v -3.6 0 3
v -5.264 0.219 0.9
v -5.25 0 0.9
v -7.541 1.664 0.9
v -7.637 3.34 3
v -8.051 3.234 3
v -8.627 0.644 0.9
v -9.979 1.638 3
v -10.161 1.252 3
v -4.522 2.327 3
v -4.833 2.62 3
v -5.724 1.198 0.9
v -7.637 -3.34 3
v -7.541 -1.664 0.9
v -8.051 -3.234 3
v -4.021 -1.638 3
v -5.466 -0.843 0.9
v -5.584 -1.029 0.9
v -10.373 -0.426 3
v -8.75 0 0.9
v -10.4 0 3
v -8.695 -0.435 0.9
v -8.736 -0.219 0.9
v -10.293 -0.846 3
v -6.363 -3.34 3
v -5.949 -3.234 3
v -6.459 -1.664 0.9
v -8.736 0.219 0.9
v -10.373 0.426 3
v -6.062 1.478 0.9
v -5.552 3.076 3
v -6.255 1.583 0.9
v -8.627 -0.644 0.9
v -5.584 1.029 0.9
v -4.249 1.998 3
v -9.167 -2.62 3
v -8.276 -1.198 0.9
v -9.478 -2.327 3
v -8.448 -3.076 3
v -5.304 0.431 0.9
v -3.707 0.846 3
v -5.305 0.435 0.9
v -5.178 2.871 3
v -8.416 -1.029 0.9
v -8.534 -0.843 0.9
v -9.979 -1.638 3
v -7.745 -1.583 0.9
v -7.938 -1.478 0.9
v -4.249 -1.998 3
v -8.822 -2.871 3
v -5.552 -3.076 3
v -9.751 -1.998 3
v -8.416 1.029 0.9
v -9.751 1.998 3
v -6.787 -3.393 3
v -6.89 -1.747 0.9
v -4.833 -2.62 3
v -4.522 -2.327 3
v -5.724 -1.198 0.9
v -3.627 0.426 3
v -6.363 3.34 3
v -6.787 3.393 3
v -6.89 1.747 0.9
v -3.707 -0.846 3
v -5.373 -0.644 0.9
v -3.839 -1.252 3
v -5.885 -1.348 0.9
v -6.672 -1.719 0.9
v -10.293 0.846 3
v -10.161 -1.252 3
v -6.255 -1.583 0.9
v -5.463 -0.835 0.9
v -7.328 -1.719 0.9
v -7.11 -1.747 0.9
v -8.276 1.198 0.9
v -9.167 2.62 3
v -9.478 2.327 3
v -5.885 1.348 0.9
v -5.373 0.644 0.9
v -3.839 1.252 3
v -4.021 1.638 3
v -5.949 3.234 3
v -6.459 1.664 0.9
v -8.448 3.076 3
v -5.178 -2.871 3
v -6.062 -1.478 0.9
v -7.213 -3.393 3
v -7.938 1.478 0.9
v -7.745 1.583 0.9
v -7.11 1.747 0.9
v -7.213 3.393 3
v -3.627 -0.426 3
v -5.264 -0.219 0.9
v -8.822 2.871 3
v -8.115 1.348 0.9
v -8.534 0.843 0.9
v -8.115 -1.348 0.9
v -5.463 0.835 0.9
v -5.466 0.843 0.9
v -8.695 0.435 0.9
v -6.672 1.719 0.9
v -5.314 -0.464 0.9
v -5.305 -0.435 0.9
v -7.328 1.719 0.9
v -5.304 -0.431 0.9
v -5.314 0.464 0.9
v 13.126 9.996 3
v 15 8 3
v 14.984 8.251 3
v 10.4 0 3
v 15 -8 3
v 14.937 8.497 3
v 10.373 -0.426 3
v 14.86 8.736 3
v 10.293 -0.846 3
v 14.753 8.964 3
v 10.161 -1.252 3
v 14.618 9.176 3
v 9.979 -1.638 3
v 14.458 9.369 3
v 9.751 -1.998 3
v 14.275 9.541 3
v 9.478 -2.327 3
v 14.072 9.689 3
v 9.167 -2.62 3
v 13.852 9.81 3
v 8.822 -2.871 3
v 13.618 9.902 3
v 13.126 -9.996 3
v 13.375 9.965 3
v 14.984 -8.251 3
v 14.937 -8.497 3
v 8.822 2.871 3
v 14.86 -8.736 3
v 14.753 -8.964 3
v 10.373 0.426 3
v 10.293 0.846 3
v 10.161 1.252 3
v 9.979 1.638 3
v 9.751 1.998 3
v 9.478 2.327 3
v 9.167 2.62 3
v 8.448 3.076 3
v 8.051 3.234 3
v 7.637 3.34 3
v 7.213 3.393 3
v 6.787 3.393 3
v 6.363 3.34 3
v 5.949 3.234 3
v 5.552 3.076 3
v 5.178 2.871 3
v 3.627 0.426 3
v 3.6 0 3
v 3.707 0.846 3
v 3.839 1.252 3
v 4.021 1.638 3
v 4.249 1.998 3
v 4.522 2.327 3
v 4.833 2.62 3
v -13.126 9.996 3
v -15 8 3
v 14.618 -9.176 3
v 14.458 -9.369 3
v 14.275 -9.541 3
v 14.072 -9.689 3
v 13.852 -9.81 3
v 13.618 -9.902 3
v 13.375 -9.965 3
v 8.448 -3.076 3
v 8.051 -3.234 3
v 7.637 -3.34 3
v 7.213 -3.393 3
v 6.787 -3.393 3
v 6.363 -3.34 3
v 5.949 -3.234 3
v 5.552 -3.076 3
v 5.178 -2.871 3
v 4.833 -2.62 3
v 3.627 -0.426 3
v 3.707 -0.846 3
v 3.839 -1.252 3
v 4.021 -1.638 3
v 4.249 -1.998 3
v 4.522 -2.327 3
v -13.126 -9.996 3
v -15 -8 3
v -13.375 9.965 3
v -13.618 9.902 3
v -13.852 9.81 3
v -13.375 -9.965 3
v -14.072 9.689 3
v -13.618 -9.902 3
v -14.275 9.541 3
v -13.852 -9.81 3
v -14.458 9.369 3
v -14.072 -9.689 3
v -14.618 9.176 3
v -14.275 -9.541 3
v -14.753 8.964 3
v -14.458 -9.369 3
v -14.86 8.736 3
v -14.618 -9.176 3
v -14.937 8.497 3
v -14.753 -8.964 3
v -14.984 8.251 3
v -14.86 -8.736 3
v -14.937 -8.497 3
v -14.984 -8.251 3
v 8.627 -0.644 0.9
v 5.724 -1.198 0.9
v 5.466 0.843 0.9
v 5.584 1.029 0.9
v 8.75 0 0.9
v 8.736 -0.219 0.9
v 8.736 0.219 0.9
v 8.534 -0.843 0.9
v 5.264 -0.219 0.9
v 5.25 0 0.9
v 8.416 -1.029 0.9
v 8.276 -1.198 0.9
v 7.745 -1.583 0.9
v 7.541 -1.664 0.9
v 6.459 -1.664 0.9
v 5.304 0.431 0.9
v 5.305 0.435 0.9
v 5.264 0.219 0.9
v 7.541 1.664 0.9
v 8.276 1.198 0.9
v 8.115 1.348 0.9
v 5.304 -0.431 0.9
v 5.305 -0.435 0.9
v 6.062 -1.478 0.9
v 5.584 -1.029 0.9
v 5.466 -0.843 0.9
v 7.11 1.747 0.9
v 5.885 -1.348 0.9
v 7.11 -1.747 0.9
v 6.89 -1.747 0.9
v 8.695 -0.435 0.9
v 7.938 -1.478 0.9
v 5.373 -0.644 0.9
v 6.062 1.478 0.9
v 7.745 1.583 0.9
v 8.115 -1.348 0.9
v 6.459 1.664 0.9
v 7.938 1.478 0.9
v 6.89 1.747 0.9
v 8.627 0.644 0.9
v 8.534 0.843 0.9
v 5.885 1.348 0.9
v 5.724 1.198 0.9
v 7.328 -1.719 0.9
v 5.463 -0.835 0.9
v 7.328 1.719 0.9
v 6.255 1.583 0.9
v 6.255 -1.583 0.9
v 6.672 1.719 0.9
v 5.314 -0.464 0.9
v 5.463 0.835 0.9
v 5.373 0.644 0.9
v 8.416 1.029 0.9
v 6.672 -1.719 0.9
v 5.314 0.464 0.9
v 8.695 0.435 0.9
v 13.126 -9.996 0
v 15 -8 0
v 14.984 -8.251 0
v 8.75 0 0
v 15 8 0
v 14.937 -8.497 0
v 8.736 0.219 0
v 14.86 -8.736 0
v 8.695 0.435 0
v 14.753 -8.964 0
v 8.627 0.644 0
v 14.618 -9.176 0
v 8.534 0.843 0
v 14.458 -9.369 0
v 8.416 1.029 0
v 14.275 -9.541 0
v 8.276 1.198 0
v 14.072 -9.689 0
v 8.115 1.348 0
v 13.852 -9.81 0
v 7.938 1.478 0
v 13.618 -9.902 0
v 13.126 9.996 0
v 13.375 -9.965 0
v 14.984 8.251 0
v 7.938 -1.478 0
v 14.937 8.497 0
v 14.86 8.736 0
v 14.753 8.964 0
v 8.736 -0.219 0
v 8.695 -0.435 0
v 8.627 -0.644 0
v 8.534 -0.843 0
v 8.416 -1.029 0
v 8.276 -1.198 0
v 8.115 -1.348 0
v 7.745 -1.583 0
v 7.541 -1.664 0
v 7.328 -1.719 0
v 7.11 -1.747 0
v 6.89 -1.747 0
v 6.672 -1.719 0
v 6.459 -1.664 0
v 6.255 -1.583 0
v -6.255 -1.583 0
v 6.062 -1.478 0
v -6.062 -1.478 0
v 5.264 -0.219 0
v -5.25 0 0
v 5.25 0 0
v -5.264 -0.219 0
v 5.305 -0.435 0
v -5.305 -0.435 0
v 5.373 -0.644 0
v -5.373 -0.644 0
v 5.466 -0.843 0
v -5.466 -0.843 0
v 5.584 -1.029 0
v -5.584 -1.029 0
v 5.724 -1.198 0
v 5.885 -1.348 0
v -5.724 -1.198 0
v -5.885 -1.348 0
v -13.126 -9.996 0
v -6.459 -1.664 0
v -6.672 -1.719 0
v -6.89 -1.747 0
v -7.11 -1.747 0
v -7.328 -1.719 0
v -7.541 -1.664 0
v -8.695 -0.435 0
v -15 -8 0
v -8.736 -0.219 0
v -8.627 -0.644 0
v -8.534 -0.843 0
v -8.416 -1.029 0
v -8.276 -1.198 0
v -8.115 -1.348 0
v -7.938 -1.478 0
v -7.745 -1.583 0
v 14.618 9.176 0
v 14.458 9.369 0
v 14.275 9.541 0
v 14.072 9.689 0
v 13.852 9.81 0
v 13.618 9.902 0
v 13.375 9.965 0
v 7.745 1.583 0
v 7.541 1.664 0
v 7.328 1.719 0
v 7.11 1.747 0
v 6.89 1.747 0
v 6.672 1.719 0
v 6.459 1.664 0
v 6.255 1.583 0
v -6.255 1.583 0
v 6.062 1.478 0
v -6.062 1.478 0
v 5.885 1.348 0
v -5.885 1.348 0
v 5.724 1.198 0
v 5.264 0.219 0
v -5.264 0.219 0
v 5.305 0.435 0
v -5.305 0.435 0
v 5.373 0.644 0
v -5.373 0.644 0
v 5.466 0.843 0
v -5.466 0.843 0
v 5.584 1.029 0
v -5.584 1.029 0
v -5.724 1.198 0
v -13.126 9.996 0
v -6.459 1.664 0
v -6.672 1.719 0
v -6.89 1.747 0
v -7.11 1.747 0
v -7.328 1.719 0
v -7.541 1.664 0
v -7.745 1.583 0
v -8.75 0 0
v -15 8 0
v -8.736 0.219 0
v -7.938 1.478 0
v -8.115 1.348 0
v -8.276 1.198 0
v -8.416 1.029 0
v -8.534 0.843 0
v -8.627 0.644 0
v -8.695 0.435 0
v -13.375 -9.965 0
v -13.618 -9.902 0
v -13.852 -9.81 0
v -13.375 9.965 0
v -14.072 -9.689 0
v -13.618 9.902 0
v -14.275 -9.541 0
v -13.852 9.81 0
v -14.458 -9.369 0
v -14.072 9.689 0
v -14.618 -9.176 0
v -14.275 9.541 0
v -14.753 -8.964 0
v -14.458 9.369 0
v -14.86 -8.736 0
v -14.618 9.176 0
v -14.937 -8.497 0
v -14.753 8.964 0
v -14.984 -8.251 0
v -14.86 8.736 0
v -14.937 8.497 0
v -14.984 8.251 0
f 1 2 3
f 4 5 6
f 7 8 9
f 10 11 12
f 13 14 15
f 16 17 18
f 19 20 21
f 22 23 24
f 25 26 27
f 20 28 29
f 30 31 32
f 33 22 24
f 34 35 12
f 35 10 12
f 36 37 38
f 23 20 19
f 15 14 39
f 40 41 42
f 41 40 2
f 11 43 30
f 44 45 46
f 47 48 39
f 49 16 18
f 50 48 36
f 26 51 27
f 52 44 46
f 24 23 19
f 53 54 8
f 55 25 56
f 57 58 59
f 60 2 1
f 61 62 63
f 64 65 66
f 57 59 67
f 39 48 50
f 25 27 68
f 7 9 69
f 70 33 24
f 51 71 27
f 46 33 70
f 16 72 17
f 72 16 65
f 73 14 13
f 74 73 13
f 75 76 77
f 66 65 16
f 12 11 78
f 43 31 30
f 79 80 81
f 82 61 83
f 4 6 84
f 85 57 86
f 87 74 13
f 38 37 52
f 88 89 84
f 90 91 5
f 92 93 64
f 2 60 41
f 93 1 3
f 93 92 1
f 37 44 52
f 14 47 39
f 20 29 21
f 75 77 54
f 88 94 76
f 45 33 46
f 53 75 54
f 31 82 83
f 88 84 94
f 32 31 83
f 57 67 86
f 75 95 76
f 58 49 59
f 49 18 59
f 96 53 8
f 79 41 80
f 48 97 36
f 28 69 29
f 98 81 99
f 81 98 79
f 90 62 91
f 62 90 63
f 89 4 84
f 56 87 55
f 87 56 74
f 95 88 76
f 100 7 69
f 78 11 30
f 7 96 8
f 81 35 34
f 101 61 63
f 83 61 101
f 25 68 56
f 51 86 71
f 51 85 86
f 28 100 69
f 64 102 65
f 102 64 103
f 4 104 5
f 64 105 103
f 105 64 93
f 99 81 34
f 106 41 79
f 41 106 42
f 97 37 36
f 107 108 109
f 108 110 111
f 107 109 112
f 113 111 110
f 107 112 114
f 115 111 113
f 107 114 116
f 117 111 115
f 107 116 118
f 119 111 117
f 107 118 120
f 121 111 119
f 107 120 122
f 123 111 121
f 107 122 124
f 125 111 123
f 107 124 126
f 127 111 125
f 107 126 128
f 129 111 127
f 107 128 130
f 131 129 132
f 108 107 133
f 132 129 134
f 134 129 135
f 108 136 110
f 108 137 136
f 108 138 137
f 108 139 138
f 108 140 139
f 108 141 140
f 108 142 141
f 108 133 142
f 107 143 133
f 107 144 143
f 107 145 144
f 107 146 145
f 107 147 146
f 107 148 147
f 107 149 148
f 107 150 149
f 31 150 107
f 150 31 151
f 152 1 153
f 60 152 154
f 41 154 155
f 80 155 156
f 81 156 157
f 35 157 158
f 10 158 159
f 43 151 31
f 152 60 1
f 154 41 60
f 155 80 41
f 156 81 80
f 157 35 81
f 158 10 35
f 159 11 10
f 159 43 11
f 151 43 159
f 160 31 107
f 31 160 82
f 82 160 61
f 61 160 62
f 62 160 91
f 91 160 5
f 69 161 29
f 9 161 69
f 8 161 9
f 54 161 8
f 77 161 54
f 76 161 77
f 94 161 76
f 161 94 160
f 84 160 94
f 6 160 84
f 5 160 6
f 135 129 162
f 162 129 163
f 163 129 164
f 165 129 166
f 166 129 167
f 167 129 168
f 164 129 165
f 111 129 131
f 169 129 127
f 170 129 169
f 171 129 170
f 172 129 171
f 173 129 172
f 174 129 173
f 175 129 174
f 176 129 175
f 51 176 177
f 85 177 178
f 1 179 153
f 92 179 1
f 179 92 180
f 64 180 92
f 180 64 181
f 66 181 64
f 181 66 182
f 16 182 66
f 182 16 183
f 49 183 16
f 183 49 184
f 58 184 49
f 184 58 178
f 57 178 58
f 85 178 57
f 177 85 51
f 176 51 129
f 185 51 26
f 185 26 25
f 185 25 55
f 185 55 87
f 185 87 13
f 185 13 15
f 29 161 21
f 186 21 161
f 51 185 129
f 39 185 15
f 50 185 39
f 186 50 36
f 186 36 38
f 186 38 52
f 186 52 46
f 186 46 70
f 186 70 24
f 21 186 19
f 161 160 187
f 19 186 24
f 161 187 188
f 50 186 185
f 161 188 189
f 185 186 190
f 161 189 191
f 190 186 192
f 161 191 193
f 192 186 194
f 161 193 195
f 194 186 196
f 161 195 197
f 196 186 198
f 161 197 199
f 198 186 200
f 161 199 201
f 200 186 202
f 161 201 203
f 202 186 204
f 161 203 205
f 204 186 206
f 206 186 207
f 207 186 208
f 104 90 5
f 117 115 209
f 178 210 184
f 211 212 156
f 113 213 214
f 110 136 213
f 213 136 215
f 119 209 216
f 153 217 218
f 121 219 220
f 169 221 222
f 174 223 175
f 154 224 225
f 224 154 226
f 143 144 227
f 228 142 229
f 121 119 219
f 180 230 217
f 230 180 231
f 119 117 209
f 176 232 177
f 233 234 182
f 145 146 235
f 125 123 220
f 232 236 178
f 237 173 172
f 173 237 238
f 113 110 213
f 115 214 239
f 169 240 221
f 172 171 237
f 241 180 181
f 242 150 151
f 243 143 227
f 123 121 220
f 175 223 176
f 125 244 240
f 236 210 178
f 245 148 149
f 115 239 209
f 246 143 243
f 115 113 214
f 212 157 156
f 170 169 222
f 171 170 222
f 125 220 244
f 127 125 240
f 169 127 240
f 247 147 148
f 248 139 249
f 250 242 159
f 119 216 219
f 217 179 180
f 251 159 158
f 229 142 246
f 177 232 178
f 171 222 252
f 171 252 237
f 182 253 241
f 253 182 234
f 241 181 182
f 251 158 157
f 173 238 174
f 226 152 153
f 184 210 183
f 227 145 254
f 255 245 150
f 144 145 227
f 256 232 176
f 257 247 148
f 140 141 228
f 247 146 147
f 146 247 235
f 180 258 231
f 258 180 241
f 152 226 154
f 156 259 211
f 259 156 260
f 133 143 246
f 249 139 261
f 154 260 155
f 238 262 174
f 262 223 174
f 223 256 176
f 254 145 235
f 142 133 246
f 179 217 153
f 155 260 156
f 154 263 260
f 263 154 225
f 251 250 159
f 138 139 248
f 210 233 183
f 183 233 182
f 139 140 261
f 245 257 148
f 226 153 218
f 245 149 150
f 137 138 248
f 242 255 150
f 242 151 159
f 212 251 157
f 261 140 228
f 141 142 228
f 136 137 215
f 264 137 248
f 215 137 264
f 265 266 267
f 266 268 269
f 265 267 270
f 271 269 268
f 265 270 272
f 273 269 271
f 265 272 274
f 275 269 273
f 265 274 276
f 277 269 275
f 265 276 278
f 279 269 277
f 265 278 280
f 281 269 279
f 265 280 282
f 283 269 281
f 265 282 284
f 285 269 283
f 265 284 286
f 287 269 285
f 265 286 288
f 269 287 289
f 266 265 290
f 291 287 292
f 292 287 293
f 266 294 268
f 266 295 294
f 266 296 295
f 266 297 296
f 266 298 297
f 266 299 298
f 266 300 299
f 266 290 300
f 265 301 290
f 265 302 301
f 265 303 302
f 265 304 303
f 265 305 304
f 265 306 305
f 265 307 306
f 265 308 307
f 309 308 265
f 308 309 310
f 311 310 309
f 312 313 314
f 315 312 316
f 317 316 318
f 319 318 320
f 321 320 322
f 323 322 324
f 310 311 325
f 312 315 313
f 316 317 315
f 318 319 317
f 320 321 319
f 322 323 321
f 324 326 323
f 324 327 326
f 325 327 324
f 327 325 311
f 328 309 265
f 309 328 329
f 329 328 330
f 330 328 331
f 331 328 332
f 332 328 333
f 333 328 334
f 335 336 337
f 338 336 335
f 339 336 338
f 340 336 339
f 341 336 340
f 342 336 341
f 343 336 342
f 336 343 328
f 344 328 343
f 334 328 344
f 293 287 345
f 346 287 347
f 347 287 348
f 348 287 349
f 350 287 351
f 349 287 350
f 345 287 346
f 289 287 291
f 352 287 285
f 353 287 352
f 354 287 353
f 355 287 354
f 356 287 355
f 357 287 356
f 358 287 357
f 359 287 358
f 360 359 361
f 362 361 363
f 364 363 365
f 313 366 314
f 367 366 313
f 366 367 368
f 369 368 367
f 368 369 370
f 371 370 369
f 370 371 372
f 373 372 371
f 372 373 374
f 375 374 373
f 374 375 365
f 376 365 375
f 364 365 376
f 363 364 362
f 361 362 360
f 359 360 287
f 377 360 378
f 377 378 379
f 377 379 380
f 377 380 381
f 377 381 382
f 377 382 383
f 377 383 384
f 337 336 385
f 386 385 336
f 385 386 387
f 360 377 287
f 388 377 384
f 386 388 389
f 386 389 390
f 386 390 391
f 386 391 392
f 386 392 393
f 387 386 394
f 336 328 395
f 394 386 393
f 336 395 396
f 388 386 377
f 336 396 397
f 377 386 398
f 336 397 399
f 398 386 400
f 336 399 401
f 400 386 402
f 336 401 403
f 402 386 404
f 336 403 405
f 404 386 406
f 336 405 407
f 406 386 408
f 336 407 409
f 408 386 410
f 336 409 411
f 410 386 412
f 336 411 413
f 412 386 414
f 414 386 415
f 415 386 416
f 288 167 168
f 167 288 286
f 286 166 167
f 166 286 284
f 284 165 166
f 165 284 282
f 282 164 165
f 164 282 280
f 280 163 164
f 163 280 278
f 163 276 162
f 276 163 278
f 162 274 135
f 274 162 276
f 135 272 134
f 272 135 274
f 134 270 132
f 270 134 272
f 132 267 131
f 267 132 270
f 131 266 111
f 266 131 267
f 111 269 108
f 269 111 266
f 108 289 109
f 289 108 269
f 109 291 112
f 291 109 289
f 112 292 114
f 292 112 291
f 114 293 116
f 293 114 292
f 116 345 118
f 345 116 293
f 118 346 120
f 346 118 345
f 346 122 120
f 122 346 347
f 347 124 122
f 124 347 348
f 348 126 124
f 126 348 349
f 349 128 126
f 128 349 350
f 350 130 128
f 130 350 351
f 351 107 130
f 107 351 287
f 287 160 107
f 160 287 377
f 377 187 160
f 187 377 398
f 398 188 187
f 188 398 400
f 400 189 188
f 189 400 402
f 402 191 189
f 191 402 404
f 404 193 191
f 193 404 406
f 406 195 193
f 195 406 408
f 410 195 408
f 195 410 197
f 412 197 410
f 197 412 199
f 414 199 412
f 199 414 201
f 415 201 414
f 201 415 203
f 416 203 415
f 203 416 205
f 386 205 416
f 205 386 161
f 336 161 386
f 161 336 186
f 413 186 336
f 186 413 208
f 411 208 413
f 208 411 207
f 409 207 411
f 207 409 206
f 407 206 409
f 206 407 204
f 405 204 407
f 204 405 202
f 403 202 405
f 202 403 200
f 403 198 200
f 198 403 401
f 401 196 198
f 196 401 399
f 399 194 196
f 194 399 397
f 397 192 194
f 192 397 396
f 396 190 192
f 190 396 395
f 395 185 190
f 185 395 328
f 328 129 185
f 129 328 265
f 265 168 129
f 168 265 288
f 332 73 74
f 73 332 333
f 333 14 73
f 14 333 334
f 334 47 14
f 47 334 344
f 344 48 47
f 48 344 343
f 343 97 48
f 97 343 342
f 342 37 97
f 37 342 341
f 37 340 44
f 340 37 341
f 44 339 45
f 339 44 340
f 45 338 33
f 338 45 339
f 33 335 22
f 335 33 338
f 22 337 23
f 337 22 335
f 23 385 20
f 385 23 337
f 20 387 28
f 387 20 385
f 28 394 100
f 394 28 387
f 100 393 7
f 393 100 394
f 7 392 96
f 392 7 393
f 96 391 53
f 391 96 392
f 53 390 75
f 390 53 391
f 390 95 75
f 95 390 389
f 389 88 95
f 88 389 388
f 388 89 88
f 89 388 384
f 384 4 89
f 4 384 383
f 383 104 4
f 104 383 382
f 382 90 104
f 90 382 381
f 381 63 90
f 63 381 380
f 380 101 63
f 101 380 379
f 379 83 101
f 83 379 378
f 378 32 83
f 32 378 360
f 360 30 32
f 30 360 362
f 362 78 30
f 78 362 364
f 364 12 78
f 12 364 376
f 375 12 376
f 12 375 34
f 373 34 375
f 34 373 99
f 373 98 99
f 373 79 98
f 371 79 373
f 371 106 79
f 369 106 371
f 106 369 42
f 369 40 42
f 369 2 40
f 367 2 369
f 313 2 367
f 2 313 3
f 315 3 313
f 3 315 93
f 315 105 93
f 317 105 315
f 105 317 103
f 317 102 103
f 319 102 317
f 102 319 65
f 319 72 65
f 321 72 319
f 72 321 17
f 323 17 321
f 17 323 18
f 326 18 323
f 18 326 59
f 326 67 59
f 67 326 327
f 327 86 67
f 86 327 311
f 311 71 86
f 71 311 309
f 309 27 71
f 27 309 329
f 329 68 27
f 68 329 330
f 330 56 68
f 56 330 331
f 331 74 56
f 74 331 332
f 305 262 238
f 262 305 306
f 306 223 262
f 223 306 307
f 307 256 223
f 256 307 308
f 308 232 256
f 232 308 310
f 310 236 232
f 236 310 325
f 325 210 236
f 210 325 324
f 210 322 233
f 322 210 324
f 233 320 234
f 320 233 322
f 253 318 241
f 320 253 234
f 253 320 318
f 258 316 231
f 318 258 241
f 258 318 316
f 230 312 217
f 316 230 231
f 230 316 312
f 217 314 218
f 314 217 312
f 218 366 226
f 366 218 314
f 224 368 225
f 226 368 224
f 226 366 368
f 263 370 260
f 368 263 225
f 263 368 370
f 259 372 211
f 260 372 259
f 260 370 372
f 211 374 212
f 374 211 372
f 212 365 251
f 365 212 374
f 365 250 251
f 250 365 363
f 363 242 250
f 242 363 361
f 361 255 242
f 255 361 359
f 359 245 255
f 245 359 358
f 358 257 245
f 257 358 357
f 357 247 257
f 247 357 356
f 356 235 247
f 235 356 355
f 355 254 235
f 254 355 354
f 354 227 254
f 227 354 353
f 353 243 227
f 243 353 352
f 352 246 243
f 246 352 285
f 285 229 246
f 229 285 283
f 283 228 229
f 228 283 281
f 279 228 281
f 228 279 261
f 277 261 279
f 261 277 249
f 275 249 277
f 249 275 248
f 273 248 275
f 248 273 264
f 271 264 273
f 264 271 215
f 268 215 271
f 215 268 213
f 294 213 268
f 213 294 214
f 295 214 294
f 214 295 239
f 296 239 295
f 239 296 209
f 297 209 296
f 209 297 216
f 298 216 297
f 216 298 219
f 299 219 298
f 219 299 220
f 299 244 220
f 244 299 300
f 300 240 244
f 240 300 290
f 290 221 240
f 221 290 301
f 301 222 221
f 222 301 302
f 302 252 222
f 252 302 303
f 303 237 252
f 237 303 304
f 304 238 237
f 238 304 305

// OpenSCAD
$fn=50;

ovDims=[30,20,3];
rad=2;

difference(){
  linear_extrude(3) difference(){
    hull() for (ix=[-1,1],iy=[-1,1])
       translate([ix*(ovDims.x/2-rad),iy*(ovDims.y/2-rad)]) circle(rad);
    for(ix=[-1,1]) 
      translate([ix*7,0]) circle(d=3.5);
  }
  for(ix=[-1,1]) 
      translate([ix*7,0,0.9]) cylinder(d1=3.5,d2=6.8,h=2.1);
}
